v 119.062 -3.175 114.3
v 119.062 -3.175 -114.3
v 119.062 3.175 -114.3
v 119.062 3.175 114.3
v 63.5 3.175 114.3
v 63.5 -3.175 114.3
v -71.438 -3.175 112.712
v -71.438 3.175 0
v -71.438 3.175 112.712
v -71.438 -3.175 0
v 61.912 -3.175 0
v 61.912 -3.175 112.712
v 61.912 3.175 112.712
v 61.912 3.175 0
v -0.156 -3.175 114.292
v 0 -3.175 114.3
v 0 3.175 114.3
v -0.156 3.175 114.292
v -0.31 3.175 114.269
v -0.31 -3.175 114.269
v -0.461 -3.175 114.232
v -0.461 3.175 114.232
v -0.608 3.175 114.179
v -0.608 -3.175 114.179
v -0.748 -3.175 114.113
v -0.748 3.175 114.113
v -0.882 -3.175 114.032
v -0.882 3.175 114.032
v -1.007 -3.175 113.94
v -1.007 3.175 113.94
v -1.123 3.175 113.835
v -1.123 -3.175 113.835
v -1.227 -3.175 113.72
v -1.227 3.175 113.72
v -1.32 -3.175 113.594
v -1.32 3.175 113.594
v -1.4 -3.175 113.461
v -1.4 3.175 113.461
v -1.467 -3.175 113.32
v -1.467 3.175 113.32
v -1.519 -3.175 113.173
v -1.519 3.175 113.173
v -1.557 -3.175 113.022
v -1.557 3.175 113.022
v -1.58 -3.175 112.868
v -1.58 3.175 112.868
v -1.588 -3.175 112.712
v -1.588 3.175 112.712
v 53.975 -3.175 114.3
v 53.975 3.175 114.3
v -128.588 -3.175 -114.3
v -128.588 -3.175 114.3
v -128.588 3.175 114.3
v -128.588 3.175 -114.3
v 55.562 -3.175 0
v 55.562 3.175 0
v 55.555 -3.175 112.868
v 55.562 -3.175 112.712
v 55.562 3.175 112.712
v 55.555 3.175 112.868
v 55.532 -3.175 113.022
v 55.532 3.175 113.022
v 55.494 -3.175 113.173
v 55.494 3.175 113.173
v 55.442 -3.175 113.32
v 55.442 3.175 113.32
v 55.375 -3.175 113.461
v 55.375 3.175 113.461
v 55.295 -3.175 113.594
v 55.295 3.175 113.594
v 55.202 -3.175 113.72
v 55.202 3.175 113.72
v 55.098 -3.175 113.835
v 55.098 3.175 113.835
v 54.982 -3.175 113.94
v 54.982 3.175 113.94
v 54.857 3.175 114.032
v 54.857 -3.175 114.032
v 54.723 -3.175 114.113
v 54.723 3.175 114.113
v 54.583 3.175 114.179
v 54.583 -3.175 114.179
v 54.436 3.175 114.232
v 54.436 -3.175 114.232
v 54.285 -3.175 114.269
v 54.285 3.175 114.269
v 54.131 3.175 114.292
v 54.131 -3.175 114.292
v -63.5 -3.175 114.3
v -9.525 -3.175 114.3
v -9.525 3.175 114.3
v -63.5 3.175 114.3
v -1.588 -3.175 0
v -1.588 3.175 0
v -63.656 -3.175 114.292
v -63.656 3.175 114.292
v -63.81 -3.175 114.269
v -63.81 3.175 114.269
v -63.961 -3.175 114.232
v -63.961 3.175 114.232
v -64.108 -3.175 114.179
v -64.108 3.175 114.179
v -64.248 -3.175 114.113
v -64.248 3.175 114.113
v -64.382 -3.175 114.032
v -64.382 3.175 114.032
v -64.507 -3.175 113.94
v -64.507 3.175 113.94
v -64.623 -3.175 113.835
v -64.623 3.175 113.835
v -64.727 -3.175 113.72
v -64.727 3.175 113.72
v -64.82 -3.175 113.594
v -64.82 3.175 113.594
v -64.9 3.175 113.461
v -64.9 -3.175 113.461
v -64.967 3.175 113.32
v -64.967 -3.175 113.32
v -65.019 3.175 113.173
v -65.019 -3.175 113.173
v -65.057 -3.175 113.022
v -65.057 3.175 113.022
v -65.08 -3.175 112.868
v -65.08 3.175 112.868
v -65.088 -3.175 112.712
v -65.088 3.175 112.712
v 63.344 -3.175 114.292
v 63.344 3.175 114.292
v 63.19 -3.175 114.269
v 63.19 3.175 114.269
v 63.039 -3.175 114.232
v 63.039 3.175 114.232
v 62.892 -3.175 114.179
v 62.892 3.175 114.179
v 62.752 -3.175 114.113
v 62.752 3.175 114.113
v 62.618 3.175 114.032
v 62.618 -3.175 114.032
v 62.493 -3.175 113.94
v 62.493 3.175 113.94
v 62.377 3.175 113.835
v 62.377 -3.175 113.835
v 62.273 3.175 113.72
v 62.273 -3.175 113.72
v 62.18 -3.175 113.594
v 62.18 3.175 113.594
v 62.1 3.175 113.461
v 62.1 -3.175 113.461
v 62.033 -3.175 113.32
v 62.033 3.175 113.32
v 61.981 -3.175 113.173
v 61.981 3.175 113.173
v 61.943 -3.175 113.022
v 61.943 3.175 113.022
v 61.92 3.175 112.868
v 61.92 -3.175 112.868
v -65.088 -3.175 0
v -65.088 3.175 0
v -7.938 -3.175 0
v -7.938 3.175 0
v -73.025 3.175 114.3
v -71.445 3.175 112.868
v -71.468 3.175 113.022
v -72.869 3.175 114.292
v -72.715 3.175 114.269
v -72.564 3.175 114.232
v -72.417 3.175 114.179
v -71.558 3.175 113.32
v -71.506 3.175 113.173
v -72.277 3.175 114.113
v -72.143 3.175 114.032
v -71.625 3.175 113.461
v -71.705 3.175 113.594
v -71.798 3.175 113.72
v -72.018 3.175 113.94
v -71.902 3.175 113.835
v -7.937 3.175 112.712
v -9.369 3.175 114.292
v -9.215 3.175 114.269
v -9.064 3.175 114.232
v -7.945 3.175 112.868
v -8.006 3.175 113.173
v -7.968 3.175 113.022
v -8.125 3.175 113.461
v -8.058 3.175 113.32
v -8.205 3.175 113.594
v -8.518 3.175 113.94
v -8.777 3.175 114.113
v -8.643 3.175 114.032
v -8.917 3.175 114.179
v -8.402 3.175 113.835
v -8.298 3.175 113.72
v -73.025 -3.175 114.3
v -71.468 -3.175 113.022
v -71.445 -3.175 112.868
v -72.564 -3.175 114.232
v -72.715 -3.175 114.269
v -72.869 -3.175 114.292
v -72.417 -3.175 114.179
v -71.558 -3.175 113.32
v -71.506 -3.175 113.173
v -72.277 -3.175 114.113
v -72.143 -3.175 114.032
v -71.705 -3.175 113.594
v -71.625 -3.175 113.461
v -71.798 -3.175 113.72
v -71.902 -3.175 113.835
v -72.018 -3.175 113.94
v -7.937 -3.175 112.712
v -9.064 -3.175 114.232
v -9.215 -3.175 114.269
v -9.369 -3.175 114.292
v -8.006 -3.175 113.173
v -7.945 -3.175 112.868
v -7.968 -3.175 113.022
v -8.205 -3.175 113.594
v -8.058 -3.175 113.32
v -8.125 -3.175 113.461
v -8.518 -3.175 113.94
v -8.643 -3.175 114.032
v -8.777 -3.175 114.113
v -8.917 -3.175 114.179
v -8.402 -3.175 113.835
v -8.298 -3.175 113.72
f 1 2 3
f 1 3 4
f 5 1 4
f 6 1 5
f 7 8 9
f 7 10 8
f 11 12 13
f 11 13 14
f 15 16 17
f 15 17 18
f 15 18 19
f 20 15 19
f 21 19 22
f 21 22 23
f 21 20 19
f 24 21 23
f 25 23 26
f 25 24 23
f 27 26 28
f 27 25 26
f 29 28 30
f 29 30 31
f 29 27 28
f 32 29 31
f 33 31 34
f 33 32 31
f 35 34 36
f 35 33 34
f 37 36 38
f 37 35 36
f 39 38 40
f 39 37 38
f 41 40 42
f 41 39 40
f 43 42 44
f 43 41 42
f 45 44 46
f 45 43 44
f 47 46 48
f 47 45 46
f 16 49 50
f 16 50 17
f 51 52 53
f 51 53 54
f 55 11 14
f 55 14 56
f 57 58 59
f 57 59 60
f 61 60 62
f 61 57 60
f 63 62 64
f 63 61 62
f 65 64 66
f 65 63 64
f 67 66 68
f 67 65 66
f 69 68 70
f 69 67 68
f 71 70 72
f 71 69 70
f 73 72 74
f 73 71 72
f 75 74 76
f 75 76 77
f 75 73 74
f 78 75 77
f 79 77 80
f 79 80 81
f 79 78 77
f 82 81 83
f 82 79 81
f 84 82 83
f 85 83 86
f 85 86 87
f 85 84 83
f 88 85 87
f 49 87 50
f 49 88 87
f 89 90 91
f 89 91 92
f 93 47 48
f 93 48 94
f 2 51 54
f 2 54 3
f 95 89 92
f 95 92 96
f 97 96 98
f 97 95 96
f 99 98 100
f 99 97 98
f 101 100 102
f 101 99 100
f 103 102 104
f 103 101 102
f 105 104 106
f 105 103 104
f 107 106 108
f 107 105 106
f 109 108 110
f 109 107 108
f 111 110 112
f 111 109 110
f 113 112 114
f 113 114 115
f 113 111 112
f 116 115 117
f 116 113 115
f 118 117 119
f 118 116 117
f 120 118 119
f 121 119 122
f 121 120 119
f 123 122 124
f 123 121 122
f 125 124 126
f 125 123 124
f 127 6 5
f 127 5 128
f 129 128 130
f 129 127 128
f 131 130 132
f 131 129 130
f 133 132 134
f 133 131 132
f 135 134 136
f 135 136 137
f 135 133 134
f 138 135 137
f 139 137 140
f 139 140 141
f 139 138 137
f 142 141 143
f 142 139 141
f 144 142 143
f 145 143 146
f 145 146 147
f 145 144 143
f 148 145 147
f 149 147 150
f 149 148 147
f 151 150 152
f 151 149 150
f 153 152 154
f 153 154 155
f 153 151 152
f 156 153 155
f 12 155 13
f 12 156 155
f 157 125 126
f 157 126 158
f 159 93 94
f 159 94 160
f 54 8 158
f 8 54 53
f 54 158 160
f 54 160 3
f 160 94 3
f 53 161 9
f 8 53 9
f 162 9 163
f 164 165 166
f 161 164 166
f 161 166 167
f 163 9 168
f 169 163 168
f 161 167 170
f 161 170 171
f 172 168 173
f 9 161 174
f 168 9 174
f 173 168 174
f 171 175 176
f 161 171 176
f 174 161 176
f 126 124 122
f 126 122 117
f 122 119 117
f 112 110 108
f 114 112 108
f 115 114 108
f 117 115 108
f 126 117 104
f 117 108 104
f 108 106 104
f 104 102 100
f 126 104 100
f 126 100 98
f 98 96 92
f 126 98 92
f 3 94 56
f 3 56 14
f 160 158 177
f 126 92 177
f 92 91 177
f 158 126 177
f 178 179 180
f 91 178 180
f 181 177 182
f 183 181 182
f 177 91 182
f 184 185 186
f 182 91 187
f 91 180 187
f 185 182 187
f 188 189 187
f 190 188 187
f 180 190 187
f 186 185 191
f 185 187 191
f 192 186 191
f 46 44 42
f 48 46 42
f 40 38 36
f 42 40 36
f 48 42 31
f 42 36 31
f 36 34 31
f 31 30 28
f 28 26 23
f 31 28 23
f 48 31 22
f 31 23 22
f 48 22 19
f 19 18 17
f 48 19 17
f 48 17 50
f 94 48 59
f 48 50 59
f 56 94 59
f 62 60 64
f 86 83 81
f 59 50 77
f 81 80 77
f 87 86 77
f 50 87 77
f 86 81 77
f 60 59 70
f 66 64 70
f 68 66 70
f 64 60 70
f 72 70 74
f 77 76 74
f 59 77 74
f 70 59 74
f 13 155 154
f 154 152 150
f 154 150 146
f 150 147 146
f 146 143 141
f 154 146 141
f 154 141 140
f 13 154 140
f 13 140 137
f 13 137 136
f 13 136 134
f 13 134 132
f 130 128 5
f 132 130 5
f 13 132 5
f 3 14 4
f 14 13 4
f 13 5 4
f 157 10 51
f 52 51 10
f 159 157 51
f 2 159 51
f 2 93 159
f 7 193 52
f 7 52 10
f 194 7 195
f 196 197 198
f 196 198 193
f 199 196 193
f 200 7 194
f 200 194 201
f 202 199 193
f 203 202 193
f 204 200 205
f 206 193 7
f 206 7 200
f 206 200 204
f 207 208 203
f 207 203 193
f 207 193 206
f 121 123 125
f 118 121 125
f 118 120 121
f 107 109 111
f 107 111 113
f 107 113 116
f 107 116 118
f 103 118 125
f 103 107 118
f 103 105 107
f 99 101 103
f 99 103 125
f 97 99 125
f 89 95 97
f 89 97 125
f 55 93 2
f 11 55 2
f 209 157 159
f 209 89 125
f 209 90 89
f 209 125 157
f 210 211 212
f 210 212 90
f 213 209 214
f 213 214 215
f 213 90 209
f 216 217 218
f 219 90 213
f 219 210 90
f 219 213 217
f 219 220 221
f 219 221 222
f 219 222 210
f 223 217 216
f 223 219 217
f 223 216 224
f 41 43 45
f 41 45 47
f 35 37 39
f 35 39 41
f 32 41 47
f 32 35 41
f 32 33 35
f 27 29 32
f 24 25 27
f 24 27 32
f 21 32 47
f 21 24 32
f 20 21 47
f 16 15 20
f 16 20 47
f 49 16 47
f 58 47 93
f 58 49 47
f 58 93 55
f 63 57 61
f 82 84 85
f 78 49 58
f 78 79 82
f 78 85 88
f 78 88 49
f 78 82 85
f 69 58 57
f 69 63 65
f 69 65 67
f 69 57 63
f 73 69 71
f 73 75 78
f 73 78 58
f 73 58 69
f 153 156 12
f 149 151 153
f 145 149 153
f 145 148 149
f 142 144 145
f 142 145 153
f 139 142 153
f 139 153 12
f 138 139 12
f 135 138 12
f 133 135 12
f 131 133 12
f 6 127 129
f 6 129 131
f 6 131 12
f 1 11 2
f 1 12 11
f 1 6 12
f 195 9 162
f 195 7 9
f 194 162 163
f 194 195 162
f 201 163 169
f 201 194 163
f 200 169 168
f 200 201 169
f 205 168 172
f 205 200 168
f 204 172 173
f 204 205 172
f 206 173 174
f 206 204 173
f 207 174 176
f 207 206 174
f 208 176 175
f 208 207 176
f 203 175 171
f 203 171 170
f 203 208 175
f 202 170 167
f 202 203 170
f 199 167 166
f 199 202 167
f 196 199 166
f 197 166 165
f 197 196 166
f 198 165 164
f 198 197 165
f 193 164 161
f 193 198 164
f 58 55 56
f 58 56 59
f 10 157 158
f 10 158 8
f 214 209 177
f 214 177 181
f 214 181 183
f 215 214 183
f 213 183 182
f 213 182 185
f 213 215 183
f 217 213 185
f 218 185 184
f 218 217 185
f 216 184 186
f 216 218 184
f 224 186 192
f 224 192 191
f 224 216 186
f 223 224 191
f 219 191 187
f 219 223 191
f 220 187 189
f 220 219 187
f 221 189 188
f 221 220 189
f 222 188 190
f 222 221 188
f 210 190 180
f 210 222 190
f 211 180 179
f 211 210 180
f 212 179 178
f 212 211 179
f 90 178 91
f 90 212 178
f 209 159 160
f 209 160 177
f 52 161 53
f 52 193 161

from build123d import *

# Parameters (mm, degrees)
F1_DEPTH = 3.175


with BuildPart() as f1:
    # F0 (on Front) → F1 (new body, symmetric)
    with BuildSketch(Plane.XZ):
        with BuildLine():
            Line((-73.025, 114.3), (-128.5875, 114.3))
            Line((-128.5875, 114.3), (-128.5875, -114.3))
            Line((-128.5875, -114.3), (119.0625, -114.3))
            Line((119.0625, -114.3), (119.0625, 114.3))
            Line((119.0625, 114.3), (63.5, 114.3))
            ThreePointArc((63.5, 114.3), (62.377468, 113.835032), (61.9125, 112.7125))
            Line((61.9125, 112.7125), (61.9125, 0))
            Line((61.9125, 0), (55.5625, 0))
            Line((55.5625, 0), (55.5625, 112.7125))
            ThreePointArc((55.5625, 112.7125), (55.097532, 113.835032), (53.975, 114.3))
            Line((53.975, 114.3), (0, 114.3))
            ThreePointArc((0, 114.3), (-1.122532, 113.835032), (-1.5875, 112.7125))
            Line((-1.5875, 112.7125), (-1.5875, 0))
            Line((-1.5875, 0), (-7.9375, 0))
            Line((-7.9375, 0), (-7.9375, 112.7125))
            ThreePointArc((-7.9375, 112.7125), (-8.402468, 113.835032), (-9.525, 114.3))
            Line((-9.525, 114.3), (-63.5, 114.3))
            ThreePointArc((-63.5, 114.3), (-64.622532, 113.835032), (-65.0875, 112.7125))
            Line((-65.0875, 112.7125), (-65.0875, 0))
            Line((-65.0875, 0), (-71.4375, 0))
            Line((-71.4375, 0), (-71.4375, 112.7125))
            ThreePointArc((-71.4375, 112.7125), (-71.902468, 113.835032), (-73.025, 114.3))
        make_face()
    extrude(amount=F1_DEPTH, both=True)


solid = f1.part
